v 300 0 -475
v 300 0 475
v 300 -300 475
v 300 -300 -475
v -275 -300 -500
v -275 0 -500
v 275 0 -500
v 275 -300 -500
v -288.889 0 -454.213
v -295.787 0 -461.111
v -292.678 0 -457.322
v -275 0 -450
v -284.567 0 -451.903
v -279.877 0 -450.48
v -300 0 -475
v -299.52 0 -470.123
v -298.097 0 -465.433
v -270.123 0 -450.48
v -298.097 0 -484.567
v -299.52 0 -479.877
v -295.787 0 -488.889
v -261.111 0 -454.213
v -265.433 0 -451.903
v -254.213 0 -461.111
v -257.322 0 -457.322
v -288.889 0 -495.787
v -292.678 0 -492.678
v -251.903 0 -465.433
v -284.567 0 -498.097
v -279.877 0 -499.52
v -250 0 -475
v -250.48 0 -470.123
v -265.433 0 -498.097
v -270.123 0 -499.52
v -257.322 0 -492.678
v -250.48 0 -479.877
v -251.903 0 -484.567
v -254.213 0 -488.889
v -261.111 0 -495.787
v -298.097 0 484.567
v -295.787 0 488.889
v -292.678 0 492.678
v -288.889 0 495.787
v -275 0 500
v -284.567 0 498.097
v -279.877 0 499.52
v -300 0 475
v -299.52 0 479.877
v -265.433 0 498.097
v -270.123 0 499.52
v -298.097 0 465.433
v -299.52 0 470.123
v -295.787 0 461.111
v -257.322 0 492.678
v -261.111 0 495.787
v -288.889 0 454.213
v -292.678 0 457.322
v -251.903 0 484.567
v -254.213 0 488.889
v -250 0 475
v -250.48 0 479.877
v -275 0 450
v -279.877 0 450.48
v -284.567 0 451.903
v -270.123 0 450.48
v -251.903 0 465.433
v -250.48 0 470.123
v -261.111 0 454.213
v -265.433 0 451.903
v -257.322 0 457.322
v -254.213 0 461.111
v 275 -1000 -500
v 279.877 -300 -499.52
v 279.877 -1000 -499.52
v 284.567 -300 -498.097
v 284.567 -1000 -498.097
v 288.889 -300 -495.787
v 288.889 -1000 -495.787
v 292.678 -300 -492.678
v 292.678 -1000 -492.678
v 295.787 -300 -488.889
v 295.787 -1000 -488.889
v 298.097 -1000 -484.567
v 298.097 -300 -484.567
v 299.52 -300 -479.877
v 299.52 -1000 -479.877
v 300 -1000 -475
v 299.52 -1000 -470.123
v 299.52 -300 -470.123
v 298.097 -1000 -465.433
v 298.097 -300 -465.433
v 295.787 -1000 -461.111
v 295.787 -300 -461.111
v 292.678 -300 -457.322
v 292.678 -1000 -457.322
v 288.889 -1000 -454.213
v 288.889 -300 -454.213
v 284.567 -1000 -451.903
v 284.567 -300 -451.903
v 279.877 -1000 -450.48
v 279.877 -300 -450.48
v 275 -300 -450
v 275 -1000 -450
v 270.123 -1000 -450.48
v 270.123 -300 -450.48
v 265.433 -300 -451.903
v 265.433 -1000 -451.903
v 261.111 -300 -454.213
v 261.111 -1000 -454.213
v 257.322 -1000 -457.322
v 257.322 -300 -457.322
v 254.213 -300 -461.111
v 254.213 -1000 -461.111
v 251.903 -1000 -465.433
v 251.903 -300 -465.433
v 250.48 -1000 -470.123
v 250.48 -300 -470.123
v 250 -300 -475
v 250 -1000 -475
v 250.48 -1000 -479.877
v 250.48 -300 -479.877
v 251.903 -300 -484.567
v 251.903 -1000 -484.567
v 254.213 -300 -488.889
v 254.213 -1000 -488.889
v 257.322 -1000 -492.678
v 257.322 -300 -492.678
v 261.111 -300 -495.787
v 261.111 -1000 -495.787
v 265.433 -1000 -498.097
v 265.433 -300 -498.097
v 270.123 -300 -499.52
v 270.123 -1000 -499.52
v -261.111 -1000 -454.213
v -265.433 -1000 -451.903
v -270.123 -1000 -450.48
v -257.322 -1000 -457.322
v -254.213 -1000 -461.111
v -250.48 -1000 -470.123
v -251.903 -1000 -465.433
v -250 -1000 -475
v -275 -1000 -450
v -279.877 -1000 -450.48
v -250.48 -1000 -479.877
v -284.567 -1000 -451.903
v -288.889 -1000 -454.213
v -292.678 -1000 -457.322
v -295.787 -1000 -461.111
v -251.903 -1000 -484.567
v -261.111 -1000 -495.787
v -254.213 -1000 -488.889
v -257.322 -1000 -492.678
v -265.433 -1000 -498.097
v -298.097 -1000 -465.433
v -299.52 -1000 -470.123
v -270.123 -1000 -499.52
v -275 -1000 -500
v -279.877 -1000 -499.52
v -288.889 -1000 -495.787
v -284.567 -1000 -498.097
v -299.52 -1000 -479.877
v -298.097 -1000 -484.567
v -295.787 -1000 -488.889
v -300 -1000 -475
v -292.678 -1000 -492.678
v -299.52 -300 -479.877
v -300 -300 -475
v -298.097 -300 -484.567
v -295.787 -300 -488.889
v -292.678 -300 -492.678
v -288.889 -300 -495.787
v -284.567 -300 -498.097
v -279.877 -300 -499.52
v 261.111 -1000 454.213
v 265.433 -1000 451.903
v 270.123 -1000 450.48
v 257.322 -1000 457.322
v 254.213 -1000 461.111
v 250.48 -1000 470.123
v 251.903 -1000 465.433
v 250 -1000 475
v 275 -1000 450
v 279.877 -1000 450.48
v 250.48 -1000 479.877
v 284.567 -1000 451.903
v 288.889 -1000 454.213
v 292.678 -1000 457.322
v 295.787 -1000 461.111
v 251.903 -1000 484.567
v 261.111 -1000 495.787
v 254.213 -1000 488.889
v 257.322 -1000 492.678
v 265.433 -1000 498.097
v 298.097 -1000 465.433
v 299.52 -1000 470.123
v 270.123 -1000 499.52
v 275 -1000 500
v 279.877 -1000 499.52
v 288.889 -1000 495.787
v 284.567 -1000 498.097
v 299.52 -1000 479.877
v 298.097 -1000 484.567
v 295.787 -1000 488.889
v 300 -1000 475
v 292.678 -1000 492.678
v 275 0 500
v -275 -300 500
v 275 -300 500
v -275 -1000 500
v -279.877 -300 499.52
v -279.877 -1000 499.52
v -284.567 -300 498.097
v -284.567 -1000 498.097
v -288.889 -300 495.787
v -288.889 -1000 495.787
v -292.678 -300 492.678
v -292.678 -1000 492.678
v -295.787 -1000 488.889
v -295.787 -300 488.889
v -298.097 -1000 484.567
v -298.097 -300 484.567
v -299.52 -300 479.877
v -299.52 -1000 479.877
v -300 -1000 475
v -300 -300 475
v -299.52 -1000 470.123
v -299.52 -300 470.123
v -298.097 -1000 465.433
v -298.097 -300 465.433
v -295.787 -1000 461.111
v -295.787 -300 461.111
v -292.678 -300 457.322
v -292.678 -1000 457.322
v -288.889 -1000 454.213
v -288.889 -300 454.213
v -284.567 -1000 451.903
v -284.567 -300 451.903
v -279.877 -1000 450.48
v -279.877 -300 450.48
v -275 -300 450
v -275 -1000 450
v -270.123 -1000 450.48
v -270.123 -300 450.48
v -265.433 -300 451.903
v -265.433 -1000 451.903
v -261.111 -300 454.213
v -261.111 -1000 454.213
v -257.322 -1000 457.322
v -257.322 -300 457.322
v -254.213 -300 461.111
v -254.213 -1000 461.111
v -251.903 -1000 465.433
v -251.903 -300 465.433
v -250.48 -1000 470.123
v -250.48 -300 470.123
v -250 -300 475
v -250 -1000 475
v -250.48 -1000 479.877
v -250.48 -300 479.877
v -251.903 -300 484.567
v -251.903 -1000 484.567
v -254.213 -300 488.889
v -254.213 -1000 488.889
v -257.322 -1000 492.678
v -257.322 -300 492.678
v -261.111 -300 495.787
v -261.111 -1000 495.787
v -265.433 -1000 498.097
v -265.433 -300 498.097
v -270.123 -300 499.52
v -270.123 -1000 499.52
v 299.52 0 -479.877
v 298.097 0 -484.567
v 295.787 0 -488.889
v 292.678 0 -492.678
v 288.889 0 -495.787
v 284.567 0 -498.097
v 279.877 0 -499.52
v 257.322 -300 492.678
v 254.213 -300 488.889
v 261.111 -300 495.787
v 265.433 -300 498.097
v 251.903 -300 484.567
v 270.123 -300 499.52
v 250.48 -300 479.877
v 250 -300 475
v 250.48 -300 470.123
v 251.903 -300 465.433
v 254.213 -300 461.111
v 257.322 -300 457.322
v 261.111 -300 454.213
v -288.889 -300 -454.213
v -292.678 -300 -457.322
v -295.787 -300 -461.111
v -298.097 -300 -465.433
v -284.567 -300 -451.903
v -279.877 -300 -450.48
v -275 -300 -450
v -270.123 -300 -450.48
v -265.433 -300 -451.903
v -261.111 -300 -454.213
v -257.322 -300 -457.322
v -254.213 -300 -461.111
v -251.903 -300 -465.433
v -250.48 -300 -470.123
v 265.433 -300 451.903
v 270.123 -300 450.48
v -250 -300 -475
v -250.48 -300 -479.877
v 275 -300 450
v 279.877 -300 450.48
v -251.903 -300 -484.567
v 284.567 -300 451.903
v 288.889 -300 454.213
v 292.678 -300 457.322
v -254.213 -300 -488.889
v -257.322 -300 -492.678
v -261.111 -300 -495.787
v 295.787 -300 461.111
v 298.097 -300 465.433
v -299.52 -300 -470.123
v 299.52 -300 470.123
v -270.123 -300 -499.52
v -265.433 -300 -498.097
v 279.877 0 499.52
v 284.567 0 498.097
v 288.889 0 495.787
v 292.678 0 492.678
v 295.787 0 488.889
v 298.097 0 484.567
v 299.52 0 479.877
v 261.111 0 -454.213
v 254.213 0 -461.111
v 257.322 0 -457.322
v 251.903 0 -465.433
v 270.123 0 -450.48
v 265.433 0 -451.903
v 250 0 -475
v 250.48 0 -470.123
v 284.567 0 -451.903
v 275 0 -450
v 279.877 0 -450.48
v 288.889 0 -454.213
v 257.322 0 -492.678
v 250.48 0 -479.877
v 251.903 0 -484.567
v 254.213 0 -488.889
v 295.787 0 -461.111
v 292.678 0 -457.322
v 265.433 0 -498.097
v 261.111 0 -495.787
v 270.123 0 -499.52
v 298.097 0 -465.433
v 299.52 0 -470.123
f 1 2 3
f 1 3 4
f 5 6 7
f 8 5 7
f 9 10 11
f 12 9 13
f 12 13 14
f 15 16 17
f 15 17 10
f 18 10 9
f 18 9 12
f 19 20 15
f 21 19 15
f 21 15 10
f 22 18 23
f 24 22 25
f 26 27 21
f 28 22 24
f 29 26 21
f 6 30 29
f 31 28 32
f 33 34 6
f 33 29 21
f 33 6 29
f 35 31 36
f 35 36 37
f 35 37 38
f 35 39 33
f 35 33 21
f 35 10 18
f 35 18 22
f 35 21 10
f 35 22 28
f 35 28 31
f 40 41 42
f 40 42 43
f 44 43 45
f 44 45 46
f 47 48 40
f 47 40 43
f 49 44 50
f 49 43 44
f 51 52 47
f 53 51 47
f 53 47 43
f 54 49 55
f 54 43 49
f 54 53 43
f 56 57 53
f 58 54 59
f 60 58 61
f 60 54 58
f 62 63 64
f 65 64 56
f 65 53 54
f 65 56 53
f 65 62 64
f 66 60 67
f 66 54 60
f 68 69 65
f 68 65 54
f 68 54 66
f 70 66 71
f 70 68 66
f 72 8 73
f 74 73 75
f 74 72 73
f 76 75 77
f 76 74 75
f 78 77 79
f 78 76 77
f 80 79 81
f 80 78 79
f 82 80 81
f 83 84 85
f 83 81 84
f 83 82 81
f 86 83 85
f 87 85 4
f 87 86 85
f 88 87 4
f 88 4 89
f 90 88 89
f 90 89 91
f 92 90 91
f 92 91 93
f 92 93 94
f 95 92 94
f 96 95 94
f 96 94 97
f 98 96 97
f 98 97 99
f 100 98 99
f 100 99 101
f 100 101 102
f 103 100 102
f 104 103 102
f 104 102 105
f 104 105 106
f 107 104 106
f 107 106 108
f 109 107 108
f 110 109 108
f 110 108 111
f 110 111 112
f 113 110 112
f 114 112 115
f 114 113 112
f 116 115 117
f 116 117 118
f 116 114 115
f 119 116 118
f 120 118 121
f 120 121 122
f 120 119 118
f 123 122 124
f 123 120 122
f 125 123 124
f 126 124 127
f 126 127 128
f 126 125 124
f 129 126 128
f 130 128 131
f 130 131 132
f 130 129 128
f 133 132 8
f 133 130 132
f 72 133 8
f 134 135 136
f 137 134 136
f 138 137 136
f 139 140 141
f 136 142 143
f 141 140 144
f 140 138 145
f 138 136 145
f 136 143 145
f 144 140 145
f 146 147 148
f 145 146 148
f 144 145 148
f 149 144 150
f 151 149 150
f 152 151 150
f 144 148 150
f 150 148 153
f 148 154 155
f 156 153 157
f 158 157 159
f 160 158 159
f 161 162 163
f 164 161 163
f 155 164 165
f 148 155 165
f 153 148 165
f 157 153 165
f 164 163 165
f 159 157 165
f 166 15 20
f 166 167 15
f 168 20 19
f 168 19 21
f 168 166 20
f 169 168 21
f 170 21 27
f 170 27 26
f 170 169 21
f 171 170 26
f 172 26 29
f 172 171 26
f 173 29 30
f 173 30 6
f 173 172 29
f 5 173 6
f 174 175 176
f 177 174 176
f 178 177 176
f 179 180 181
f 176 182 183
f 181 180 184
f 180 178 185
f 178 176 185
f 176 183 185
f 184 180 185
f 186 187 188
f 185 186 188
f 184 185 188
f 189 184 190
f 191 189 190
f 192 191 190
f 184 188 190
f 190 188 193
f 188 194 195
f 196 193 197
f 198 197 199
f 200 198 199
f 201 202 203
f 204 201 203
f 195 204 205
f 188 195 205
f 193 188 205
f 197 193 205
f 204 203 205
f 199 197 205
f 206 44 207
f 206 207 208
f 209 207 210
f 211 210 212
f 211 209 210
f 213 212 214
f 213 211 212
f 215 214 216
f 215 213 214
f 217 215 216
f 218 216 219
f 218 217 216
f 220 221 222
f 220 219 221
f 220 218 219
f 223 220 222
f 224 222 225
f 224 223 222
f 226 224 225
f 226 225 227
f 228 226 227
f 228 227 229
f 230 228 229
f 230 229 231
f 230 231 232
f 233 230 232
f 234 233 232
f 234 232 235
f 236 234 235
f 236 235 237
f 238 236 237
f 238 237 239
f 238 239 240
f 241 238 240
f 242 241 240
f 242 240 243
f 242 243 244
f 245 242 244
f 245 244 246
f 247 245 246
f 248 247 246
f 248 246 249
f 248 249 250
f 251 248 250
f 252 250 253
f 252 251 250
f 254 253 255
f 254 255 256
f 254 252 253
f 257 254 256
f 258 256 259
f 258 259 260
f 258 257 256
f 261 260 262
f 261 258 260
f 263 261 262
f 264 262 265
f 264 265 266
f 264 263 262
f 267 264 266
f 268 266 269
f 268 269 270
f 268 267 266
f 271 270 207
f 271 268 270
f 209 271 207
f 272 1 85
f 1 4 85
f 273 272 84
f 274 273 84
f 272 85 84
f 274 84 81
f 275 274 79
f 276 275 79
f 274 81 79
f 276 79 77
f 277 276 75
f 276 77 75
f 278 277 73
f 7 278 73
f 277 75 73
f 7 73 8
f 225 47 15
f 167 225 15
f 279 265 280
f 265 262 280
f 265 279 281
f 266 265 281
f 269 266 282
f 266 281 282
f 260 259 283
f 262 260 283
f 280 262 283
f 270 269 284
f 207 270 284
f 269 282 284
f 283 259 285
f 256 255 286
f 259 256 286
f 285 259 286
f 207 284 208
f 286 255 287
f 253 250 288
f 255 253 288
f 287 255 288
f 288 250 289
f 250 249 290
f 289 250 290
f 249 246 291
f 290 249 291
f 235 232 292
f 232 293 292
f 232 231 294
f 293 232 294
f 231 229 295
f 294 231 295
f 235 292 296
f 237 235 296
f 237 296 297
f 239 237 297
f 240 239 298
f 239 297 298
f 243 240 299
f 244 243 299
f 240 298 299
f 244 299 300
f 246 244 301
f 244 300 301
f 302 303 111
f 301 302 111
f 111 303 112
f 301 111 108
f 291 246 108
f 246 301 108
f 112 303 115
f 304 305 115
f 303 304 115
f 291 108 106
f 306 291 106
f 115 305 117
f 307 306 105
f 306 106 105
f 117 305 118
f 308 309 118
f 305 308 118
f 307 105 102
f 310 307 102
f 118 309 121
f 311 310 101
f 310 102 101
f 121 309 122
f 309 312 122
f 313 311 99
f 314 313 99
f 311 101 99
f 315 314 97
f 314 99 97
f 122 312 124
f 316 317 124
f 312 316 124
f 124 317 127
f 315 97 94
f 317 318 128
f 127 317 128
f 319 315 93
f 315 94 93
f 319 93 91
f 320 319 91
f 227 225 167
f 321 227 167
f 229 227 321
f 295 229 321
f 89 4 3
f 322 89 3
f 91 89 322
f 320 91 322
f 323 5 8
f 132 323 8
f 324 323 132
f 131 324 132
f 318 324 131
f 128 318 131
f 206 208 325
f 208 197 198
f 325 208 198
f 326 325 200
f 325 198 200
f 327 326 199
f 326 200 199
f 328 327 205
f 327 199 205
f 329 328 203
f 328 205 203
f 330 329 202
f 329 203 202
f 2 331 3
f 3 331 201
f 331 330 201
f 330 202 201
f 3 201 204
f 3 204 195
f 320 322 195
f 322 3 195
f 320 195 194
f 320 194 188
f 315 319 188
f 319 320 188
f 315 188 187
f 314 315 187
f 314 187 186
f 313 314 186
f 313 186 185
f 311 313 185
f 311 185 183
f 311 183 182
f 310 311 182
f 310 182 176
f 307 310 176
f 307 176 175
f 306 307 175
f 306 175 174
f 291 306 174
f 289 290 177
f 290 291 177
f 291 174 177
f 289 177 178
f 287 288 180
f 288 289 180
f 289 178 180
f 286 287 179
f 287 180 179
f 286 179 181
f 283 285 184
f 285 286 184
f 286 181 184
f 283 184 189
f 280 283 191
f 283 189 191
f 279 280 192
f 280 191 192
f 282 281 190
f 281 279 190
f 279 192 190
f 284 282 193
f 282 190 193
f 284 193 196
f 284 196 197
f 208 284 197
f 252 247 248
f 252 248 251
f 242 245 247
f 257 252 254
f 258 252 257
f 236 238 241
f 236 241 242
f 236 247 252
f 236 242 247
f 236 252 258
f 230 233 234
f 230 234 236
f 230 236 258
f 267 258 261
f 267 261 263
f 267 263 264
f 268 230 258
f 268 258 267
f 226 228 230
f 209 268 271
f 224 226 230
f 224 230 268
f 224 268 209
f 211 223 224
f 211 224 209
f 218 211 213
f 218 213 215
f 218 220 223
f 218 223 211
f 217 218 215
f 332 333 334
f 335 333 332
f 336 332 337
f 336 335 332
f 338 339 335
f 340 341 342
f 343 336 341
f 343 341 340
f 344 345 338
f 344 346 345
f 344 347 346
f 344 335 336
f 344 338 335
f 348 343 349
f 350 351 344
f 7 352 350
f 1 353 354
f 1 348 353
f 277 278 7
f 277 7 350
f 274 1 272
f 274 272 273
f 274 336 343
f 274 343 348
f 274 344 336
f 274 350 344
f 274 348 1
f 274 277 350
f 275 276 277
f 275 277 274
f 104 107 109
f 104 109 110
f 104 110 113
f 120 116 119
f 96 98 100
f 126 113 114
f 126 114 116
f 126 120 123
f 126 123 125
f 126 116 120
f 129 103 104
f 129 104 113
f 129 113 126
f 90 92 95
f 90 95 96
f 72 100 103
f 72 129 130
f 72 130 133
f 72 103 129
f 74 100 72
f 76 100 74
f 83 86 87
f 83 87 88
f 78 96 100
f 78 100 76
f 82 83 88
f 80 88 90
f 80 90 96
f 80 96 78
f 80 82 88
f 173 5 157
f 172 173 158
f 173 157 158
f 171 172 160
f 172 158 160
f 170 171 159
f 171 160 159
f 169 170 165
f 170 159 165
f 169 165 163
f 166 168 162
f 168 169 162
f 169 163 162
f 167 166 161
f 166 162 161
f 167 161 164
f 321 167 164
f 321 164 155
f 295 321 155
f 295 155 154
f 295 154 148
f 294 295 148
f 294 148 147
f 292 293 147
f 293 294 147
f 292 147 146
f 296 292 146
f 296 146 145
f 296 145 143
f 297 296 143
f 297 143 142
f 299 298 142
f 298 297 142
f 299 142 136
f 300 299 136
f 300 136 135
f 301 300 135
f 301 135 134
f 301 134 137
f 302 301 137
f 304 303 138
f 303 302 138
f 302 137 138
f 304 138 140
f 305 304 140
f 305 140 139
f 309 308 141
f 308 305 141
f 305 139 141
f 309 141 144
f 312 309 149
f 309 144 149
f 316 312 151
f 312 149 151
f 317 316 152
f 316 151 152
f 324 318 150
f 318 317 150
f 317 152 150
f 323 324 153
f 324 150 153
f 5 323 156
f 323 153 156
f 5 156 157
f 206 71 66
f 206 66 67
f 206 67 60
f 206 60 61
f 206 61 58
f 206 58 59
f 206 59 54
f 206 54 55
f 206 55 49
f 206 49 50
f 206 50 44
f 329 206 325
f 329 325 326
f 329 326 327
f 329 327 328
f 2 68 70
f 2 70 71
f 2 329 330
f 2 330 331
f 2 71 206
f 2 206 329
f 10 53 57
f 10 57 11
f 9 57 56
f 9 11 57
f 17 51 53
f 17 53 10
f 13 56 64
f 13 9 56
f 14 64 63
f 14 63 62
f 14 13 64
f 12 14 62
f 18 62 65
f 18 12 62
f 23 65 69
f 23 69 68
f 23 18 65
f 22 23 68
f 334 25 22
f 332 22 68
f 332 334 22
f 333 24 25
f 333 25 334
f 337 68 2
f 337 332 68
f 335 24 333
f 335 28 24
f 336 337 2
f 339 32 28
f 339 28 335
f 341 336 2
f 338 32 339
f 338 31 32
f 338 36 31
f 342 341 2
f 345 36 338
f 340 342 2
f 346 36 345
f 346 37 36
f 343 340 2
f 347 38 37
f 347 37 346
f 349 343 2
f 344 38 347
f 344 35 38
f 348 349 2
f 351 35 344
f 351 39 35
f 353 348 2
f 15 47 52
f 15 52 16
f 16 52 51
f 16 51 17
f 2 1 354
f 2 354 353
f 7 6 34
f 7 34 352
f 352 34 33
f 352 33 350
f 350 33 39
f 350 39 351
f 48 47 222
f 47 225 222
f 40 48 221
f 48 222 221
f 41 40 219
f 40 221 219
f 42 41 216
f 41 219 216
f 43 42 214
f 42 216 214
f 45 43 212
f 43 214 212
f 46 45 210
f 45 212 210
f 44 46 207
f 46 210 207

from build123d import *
from build123d.topology import SkipClean

# Parameters (mm, degrees)
SKETCH_2_W               = 600
SKETCH_2_H               = 1000
EXTRUDE_1_DEPTH          = 300
FILLET_1_R               = 25
EXTRUDE_START            = -1000
SKETCH_3_R               = 25
EXTRUDE_2_DEPTH          = 1000
MIRROR_START             = -1000
MIRROR_2_COPY_1_SKETCH_R = 25
MIRROR_2_COPY_1_DEPTH    = 1000


with BuildPart() as part:
    # 草图2 → 凸台-拉伸1 (new body)
    with BuildSketch(Plane(origin=(0, 0, 0), x_dir=(1, 0, 0), z_dir=(0, 1, 0))):
        Rectangle(SKETCH_2_W, SKETCH_2_H)
    extrude(amount=-EXTRUDE_1_DEPTH)

    # 圆角1
    fillet_1_edges = [part.edges().sort_by_distance(p)[0] for p in [
        (-300, -150, -500),
        (300, -150, -500),
        (-300, -150, 500),
        (300, -150, 500),
    ]]
    fillet(fillet_1_edges, radius=FILLET_1_R)

    # 草图3 → 凸台-拉伸2 (add)
    with SkipClean():  # the faces are left unmerged after this step: merging them gives an invalid solid
        with BuildSketch(Plane(origin=(0, 0, 0), x_dir=(1, 0, 0), z_dir=(0, 1, 0)).offset(EXTRUDE_START)):
            with Locations((275, -475)):
                Circle(SKETCH_3_R)
        extrude_2 = extrude(amount=EXTRUDE_2_DEPTH)

    # 镜向1: 凸台-拉伸2 across plane
    with SkipClean():  # the faces are left unmerged after this step: merging them gives an invalid solid
        add(extrude_2.mirror(Plane(origin=(0, 0, 0), x_dir=(0, 0, 1), z_dir=(1, 0, 0))))

    # 镜向2: 凸台-拉伸2 across plane
    with SkipClean():  # the faces are left unmerged after this step: merging them gives an invalid solid
        add(extrude_2.mirror(Plane.XY))

    # 镜向2 copy 1 sketch → 镜向2 copy 1 (add)
    with SkipClean():  # the faces are left unmerged after this step: merging them gives an invalid solid
        with BuildSketch(Plane(origin=(0, 0, 0), x_dir=(-1, 0, 0), z_dir=(0, 1, 0)).offset(MIRROR_START)):
            with Locations((275, -475)):
                Circle(MIRROR_2_COPY_1_SKETCH_R)
        extrude(amount=MIRROR_2_COPY_1_DEPTH)


solid = part.part
